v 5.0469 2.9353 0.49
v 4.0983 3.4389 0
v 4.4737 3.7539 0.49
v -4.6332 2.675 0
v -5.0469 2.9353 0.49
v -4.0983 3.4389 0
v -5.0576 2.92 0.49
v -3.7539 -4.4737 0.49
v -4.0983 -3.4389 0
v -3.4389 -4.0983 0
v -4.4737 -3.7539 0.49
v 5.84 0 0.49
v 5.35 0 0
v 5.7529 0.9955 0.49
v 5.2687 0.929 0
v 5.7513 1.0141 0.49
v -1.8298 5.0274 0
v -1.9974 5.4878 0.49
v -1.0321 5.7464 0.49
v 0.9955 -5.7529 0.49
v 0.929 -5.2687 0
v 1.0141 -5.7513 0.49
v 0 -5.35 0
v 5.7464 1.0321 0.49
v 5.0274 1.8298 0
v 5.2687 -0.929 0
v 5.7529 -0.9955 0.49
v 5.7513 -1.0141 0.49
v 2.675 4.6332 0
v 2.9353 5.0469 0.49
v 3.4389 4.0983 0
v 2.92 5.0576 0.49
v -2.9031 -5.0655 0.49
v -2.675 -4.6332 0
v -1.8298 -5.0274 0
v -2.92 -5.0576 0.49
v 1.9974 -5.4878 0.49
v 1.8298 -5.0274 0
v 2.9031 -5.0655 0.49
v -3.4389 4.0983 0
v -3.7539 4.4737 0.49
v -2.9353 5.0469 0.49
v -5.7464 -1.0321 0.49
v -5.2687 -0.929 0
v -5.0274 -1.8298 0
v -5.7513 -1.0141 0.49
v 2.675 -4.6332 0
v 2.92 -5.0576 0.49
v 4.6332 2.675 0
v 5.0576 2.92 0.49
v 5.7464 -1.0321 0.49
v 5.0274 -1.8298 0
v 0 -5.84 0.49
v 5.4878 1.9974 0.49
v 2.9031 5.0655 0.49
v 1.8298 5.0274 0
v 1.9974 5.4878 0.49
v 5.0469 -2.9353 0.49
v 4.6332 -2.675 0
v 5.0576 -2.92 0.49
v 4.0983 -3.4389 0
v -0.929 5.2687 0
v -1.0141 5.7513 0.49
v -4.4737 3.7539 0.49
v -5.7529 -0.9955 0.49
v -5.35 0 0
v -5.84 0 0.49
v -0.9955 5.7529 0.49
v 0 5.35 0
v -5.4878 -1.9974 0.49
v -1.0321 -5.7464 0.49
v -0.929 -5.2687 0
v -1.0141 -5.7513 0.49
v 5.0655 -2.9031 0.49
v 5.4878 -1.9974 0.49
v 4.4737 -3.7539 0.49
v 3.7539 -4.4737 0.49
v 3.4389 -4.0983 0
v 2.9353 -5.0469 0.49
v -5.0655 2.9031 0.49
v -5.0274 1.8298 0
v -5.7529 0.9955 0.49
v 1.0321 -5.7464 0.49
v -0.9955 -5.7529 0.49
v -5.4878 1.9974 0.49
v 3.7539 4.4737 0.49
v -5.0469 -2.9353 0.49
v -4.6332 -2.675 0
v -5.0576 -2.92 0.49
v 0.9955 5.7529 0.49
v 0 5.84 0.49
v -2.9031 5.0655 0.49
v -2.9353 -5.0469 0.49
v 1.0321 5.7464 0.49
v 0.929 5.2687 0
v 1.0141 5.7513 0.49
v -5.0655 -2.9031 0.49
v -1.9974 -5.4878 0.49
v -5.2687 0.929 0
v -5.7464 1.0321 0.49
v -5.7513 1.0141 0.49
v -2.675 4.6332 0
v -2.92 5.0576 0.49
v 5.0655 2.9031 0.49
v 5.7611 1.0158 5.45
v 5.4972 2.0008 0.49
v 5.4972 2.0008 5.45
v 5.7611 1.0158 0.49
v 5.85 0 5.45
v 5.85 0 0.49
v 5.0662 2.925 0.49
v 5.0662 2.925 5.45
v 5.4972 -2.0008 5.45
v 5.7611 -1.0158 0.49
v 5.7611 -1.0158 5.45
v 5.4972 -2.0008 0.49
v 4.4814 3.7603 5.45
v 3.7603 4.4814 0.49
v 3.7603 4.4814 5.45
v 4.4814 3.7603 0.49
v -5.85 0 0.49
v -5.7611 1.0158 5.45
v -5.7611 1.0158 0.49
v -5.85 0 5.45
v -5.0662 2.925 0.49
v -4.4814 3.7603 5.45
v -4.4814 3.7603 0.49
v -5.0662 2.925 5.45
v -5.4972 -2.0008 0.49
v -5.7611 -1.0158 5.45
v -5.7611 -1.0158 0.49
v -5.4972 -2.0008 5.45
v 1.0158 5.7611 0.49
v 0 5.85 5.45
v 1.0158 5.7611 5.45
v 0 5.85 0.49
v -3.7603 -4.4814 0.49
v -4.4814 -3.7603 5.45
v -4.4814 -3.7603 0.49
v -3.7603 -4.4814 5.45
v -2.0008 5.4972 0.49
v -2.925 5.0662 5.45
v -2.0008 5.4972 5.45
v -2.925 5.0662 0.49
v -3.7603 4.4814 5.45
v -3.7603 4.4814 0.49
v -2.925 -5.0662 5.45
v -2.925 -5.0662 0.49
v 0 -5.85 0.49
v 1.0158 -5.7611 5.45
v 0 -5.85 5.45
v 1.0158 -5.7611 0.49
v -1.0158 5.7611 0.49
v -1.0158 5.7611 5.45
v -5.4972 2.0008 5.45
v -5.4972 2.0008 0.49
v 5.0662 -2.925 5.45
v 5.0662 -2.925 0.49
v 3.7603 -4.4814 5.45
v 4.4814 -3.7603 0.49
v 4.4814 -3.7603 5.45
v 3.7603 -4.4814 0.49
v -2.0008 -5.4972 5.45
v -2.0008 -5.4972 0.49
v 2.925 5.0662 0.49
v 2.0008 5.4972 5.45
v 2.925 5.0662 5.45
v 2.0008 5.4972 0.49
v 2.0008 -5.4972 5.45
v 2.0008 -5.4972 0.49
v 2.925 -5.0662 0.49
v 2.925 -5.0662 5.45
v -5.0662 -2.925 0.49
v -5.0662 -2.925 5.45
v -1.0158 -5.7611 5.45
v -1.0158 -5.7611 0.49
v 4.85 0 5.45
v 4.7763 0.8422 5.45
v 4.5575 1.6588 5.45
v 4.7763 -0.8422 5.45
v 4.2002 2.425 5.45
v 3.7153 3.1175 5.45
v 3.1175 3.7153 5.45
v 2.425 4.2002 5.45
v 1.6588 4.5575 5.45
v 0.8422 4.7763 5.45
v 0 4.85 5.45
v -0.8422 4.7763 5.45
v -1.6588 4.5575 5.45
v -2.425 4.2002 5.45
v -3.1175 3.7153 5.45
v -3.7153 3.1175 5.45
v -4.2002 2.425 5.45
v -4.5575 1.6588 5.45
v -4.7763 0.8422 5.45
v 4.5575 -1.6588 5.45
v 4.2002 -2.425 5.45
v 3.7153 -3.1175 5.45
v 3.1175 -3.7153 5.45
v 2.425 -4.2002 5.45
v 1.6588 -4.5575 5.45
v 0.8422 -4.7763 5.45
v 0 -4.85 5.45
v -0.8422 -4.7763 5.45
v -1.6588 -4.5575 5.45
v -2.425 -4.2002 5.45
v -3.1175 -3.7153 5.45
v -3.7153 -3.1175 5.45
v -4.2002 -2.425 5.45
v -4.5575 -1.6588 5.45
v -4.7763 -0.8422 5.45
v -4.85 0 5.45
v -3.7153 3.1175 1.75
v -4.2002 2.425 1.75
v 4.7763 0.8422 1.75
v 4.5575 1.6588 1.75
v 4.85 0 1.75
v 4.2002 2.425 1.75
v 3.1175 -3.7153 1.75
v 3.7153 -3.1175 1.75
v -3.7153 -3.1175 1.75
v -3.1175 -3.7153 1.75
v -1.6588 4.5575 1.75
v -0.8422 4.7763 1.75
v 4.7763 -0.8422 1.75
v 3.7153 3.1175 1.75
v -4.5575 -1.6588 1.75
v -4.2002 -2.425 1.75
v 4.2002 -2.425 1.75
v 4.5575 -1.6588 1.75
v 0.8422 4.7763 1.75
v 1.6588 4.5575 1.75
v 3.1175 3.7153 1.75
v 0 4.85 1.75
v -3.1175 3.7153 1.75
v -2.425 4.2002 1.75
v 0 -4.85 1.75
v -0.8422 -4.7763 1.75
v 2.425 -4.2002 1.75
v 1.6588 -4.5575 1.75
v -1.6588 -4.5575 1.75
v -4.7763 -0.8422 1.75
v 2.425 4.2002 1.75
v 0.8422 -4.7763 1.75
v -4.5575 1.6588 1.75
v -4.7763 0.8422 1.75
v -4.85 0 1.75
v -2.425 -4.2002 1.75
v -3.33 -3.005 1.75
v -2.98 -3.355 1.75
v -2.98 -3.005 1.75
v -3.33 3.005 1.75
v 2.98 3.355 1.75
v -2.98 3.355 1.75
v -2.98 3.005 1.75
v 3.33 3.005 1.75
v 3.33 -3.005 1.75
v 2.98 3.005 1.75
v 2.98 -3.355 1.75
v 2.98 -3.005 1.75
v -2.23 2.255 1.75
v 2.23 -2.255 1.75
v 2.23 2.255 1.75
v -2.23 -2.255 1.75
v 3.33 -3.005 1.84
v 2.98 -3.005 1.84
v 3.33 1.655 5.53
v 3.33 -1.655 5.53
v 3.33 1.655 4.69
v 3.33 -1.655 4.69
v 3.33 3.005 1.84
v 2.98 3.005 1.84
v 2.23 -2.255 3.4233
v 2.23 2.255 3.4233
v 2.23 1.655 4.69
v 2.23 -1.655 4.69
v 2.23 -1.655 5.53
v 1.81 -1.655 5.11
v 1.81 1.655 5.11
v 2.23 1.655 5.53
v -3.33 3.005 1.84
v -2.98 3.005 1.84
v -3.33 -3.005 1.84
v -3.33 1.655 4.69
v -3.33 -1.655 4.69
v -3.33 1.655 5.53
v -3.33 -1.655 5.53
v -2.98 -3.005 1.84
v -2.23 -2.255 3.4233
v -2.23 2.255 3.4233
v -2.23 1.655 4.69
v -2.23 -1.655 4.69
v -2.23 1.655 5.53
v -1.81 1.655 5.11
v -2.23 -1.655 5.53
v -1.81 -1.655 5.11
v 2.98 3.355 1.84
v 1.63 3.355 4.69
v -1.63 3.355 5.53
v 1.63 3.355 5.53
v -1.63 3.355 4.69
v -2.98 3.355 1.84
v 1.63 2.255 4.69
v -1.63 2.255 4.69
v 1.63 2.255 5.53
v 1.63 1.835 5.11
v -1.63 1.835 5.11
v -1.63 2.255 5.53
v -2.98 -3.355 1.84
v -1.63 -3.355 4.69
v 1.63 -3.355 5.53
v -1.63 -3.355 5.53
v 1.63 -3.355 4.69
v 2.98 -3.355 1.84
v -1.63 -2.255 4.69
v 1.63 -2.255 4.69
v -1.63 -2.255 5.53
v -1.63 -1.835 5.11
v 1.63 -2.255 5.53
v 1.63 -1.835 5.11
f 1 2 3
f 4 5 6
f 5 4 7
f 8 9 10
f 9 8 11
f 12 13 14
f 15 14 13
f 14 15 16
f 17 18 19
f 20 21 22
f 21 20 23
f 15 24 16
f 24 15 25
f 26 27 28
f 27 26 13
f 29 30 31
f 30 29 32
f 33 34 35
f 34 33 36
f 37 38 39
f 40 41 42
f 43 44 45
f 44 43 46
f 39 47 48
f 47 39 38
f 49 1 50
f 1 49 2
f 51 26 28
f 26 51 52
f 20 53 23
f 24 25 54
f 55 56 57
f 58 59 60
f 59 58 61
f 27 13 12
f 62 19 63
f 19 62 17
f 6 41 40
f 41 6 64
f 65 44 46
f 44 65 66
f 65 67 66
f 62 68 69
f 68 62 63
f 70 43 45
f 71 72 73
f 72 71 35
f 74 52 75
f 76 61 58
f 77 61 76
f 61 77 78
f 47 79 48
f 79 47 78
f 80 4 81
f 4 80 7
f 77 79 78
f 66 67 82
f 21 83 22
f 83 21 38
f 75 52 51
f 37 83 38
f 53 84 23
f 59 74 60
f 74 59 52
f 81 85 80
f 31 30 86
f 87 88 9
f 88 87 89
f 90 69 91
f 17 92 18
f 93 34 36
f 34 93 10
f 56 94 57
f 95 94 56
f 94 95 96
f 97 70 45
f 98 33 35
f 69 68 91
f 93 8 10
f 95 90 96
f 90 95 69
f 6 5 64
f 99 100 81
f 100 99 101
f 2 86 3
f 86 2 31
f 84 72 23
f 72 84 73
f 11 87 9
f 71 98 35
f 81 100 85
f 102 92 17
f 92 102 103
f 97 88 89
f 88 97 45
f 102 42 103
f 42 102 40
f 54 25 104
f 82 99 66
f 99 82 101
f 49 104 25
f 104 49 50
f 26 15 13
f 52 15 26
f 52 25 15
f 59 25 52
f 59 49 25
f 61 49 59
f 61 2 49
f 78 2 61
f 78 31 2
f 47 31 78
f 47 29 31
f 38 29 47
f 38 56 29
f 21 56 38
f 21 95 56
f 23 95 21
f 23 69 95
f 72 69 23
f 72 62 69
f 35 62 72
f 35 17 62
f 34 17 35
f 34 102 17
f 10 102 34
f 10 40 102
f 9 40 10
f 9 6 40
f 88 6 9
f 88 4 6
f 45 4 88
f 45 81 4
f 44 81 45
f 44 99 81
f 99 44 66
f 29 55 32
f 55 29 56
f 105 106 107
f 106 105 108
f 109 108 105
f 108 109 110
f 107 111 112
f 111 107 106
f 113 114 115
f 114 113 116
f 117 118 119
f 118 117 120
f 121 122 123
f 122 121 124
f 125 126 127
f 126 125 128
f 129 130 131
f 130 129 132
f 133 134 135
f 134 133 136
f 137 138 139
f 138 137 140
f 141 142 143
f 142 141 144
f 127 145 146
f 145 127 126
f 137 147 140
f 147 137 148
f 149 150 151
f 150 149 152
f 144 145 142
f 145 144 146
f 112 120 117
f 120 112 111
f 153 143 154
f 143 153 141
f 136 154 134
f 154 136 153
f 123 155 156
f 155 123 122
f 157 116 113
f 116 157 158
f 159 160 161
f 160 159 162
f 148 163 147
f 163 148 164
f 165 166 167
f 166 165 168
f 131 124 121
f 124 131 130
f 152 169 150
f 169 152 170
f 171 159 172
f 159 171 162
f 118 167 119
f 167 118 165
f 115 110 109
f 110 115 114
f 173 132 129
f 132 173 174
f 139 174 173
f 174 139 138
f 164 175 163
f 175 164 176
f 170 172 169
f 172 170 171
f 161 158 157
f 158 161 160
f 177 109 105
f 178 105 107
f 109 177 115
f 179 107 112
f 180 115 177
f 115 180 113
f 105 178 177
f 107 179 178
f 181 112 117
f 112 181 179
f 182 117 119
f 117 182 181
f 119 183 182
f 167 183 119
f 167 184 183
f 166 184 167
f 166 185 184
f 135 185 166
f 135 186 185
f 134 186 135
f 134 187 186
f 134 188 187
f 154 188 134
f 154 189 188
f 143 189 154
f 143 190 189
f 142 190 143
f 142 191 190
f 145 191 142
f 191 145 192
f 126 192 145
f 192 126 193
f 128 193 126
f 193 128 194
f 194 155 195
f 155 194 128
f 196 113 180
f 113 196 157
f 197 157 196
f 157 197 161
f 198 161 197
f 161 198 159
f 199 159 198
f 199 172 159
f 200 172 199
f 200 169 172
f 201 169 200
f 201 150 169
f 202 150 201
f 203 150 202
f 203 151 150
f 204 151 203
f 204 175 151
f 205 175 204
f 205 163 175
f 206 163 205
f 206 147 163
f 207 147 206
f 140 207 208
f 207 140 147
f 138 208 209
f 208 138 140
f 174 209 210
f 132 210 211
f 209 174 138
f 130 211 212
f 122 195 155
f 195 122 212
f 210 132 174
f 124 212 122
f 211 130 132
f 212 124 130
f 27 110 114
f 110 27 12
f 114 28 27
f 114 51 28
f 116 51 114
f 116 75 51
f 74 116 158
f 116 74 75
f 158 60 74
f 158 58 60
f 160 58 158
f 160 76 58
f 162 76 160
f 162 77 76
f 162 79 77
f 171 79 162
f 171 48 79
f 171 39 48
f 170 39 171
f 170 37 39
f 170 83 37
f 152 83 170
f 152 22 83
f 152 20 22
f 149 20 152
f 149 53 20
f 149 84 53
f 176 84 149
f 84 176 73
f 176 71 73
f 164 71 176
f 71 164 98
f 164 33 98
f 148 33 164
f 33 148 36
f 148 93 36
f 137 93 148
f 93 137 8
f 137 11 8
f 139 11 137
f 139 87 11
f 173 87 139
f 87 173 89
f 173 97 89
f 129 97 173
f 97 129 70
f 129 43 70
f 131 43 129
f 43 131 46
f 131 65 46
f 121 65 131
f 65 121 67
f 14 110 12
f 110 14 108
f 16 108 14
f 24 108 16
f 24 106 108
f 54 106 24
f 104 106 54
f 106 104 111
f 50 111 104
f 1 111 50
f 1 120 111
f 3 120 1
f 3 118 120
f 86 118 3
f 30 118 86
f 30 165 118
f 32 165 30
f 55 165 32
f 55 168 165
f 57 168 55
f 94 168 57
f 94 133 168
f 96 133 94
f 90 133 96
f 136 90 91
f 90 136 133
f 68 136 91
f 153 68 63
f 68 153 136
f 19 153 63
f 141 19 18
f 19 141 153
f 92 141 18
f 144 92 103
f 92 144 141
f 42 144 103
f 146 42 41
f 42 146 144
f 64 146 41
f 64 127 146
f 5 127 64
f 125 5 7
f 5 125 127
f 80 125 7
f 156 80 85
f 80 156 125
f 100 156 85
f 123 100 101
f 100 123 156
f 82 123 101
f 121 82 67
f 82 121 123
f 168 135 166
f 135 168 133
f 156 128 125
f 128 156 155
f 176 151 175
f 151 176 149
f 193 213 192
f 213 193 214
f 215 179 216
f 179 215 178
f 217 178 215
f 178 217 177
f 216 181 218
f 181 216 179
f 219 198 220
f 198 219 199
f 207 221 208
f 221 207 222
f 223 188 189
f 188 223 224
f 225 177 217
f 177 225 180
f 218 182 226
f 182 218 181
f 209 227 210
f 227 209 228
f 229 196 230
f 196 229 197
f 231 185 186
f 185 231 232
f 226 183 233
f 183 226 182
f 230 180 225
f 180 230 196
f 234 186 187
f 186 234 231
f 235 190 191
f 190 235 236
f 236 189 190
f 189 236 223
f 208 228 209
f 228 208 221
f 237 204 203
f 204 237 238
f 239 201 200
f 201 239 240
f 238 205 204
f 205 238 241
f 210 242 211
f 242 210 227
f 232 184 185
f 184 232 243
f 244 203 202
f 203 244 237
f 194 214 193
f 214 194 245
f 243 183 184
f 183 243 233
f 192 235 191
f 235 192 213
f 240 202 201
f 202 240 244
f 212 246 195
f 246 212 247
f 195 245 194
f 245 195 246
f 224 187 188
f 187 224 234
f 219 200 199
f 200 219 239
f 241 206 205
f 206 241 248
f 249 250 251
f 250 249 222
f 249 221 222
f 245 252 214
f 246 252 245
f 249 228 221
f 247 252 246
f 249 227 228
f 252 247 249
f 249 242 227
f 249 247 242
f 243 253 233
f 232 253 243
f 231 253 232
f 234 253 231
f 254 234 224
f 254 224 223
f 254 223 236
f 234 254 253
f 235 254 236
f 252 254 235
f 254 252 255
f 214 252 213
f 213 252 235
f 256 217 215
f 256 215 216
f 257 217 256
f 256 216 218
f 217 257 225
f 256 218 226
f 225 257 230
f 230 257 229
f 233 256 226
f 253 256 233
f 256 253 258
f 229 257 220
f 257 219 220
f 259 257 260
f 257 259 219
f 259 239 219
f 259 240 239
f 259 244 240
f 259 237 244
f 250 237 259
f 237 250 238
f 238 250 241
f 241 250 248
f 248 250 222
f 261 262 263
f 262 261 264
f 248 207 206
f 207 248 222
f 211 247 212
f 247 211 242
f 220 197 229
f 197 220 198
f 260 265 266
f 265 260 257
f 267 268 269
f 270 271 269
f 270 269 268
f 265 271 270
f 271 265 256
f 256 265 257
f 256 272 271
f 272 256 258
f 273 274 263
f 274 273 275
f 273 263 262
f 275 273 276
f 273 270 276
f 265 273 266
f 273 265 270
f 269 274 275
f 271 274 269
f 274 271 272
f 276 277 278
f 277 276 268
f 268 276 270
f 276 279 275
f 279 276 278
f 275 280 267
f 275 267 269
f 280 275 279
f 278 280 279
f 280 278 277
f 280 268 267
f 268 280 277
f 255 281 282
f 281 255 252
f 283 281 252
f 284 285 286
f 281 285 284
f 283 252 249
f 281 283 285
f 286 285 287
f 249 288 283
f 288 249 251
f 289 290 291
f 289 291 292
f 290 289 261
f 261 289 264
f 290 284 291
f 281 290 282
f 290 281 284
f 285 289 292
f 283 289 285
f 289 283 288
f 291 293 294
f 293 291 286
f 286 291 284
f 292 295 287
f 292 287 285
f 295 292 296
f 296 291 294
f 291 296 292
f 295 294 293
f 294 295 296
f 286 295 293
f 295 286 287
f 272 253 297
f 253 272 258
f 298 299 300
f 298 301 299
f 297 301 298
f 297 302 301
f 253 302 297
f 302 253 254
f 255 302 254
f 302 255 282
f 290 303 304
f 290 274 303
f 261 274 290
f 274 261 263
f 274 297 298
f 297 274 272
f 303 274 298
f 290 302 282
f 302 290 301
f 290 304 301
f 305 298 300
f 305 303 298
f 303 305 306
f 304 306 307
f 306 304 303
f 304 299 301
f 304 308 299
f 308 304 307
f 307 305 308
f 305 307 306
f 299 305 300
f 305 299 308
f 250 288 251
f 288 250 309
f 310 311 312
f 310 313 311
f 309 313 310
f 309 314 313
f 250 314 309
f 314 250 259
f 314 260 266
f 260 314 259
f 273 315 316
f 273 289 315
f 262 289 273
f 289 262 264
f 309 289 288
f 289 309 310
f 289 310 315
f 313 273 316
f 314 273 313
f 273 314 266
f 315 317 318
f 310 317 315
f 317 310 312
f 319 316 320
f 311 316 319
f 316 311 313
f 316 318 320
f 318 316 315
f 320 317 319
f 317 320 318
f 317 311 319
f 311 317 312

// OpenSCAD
// This file was processed by resolve-include.py [https://github.com/arpruss/miscellaneous-scad/blob/master/scripts/resolve-include.py] 
// to include  all the dependencies inside one file.


//BEGIN DEPENDENCY: use <tubemesh.scad>;

//BEGIN DEPENDENCY: use <eval.scad>;
function _isRange(v) = !is_list(v) && !is_string(v) && v[0] != undef;

$careful = false;

function _substr(s, start=0, stop=undef, soFar = "") =
    start >= (stop==undef ? len(s) : stop) ? soFar :
        _substr(s, start=start+1, stop=stop, soFar=str(soFar, s[start]));

function _parseInt(s, start=0, stop=undef, accumulated=0) =
    let( stop = stop==undef ? len(s) : stop )
        start >= stop ? accumulated :
        s[start] == "+" ? _parseInt(s, start=start+1, stop=stop) :
        s[start] == "-" ? -_parseInt(s, start=start+1, stop=stop) :
        let (digit = search(s[start], "0123456789"))
            digit == [] ? 0 : _parseInt(s, start=start+1, stop=stop, accumulated=accumulated*10+digit[0]);

function _findNonDigit(s, start=0) =
    start >= len(s) || s[start]<"0" || s[start]>"9" ? start :
    _findNonDigit(s, start=start+1);

function _replaceChar(s,c1,c2,pos=0,soFar="") =
    pos >= len(s) ? soFar :
    _replaceChar(s,c1,c2,pos=pos+1,soFar=str(soFar, s[pos]==c1 ? c2 : s[pos]));

function _parseUnsignedFloat(s) =
    len(s) == 0 ? 0 :
        let(
            firstNonDigit = _findNonDigit(s),
            decimalPart = s[firstNonDigit]!="." ?
                [firstNonDigit,firstNonDigit] : [firstNonDigit+1, _findNonDigit(s, start=firstNonDigit+1)],
            intPart = _parseInt(s,start=0,stop=firstNonDigit),
            fractionPart = _parseInt(s,start=decimalPart[0],stop=decimalPart[1]),
            baseExp = s[decimalPart[1]]=="e" || s[decimalPart[1]]=="E" ? pow(10,_parseInt(s, start=decimalPart[1]+1)) : 1)
            (intPart+fractionPart*pow(10,-(decimalPart[1]-decimalPart[0])))*baseExp;

function _tail(v) = len(v)>=2 ? [for(i=[1:len(v)-1]) v[i]] : [];
function _isspace(c) = (" " == c || "\t" == c || "\r" == c || "\n" == c );
function _isdigit(c) = ("0" <= c && c <= "9" );
function _isalpha(c) = ("a" <= c && c <= "z") || ("A" <= c && c <= "Z");
function _isalpha_(c) = _isalpha(c)  || c=="_";
function _isalnum_(c) = _isalpha(c) || _isdigit(c) || c=="_";
function _flattenLists(ll) = [for(a=ll) for(b=a) b];

function _spaceSequence(s, start=0, count=0) =
    len(s)>start && _isspace(s[start]) ? _spaceSequence(s, start=start+1, count=count+1) : count;
function _digitSequence(s, start=0, count=0) =
    len(s)>start && _isdigit(s[start]) ? _digitSequence(s, start=start+1,count=count+1) : count;
function _alnum_Sequence(s, start=0, count=0) =
    len(s)>start && _isalnum_(s[start]) ? _alnum_Sequence(s, start=start+1,count=count+1) : count;
function _identifierSequence(s, start=0, count=0) =
    len(s)>start && _isalpha_(s[start]) ? _alnum_Sequence(s, start=start+1, count=count+1) : count;
function _signedDigitSequence(s, start=0) =
    len(s) <= start ? 0 :
        (s[start] == "+" || s[start] == "-" ) ? 1+_digitSequence(s,start=start+1) : _digitSequence(s,start=start);
function _realStartingWithDecimal(s, start=0) =
    len(s)>start && s[start] == "." ?
        let(next = start+1+_digitSequence(s, start=start+1))
        (s[next] == "e" || s[next] == "E" ?
            next-start+1+_signedDigitSequence(s, start=next+1) : next-start)
        : 0;
function _realContinuation(s, start=0) =
    len(s) <= start ? 0 :
        let(c1=_realStartingWithDecimal(s, start=start))
        c1 > 0 ? c1 :
        s[start] == "e" || s[start] == "E" ?
            1+_signedDigitSequence(s, start=start+1) : 0;
function _positiveRealSequence(s, start=0) =
    len(s) <= start ? 0 :
        let(c1 = _realStartingWithDecimal(s, start=start))
            c1 > 0 ? c1 :
        let(c2 = _digitSequence(s, start=start))
            c2 > 0 ? c2 + _realContinuation(s, start=start+c2) : 0;

_multiSymbolOperators = [ "<=", ">=", "==", "&&", "||" ]; // must be in order of decreasing length

function _multiSymbolOperatorSequence(s, start=0) =
    (s[start]=="<" && s[start+1]=="=") ||
    (s[start]==">" && s[start+1]=="=") ||
    (s[start]=="=" && s[start+1]=="=") ||
    (s[start]=="!" && s[start+1]=="=") ||
    (s[start]=="&" && s[start+1]=="&") ||
    (s[start]=="|" && s[start+1]=="|") ? 2 : 0;

function _tokenize(s, start=0) =
    start >= len(s) ? [] :
    let(c1=_spaceSequence(s, start=start)) c1>0 ?
        concat([" "], _tokenize(s, start=start+c1)) :
    let(c2=_identifierSequence(s, start=start)) c2>0 ?
        concat([_substr(s, start=start, stop=start+c2)], _tokenize(s, start=start+c2)) :
    let(c3=_positiveRealSequence(s, start=start)) c3>0 ?
        concat([_substr(s, start=start, stop=start+c3)], _tokenize(s, start=start+c3)) :
    let(c4=_multiSymbolOperatorSequence(s, start=start)) c4>0 ?
        concat([_substr(s, start=start, stop=start+c4)], _tokenize(s, start=start+c4)) :
        concat([s[start]], _tokenize(s, start=start+1));


function _endParens(list,start=0,openCount=0,stop=undef) =
    let(stop = stop==undef ? len(list) : stop)
    start >= stop ? (openCount?undef:stop) :
    list[start][0] == ")" ?
            (openCount==1 ? start+1 : _endParens(list,start+1,stop=stop, openCount=openCount-1)) :
    _endParens(list,start+1,stop=stop, openCount=
        list[start][0] == "(" ?
            openCount+1 : openCount);

function _indexInTable(string, table, column=0) =
    let (s=search([string], table, index_col_num=column))
        s[0] == [] ? -1 : s[0][0];

_NAME = 0;
_ARITY = 1;
_PREC = 2;
_ASSOC_DIR = 3;
_ARGUMENTS_FROM_VECTOR = 4;
_OPERATOR = 5;
_EXTRA_DATA = 6;

function _func(op) = [ op, 1, -1, 1, true, op ];

_operators = [
    [ "[", 1, -1, 1, true, "[" ],
    [ "pow", 1, -1, 1, true, "^" ],
    [ "cross", 1, -1, 1, true, "cross" ],
    _func("sqrt"),
    _func("cos"),
    _func("sin"),
    _func("tan"),
    _func("acos"),
    _func("asin"),
    _func("atan"),
    _func("COS"),
    _func("SIN"),
    _func("TAN"),
    _func("ACOS"),
    _func("ASIN"),
    _func("ATAN"),
    _func("abs"),
    _func("ceil"),
    _func("exp"),
    _func("floor"),
    _func("ln"),
    _func("log"),
    _func("round"),
    _func("sign"),
    _func("norm"),
    [ "atan2", 1, -1, 1, true, "atan2" ],
    [ "ATAN2", 1, -1, 1, true, "ATAN2" ],
    [ "max", 1, -1, 1, true, "max" ],
    [ "min", 1, -1, 1, true, "min" ],
    [ "concat", 1, -1, 1, true, "concat" ],
    [ "#", 2, 0, -1, false, "#" ],
    [ "^", 2, 0, -1, false, "^" ],
    [ "#-",1, 0.5, 0, true, "-" ],
    [ "#+",1, 0.5, 0, true, "+" ],
    [ "*", 2, 1, 1, false, "*" ],
    [ "/", 2, 1, 1, false, "/" ],
    [ "%", 2, 1, 1, false, "%" ],
    [ "+", 2, 2, 1, true, "+" ],
    [ "-", 2, 2, 1, true, "-" ],
    [ "!=", 2, 3, 1, true, "!=" ],
    [ "==", 2, 3, 1, true, "==" ],
    [ "<=", 2, 3, 1, true, "<=" ],
    [ ">=", 2, 3, 1, true, ">=" ],
    [ "<", 2, 3, 1, true, "<" ],
    [ ">", 2, 3, 1, true, ">" ],
    [ "!", 1, 4, 1, true, "!" ],
    [ "&&", 2, 5, 1, true, "&&" ],
    [ "||", 2, 5, 1, true, "||" ],
    [ "?", 2, 10, -1, true, "?" ],
    [ ":", 2, 10, -1, true, ":" ],
    [ "=", 2, 30, 1, true, "=" ], // for let()
    [ "let", 1, 25, 1, true, "let" ],
    [ ",", 2, 100, 1, true, "," ]
   ];

_binary_or_unary = [ ["-", "#-"], ["+", "#+"], ["#", "["] ];

// insert parentheses in some places to tweak the order of
// operations in those contexts
function _fixBrackets(pretok,start=0) =
    start >= len(pretok) ? [] :
    pretok[start] == "[" ?
        concat(["#", "("], _fixBrackets(pretok,start=start+1)) :
    pretok[start] == "]" ?
        concat([")"], _fixBrackets(pretok,start=start+1)) :
    pretok[start] == "?" ?
        concat([pretok[start],"("], _fixBrackets(pretok,start=start+1)) :
    pretok[start] == ":" ?
        concat([")",pretok[start]], _fixBrackets(pretok,start=start+1)) :
        concat(pretok[start], _fixBrackets(pretok,start=start+1));

// disambiguate operators that can be unary or binary
function _fixUnaries(pretok) =
    [ for (i=[0:len(pretok)-1])
         let (
            a = pretok[i],
            j=_indexInTable(a, _binary_or_unary))
            (0 <= j && (i == 0 || pretok[i-1] == "(" ||
                0 <= _indexInTable(pretok[i-1], _operators)))? _binary_or_unary[j][1] : a ];

function _fixLet1(tok, start=0, stop=undef) =
    let (stop = stop==undef ? len(tok) : stop)
        start >= stop ? [] :
        tok[start][0] == "let"?
           let(endP=_endParens(tok,start=start+1,stop=stop,openCount=0)) concat([concat(tok[start], [_fixLet1(tok,start=start+2,stop=endP-1)])], _fixLet1(tok,start=endP,stop=stop)) :
        concat([tok[start]], _fixLet1(tok,start=start+1,stop=stop));

function _parsePass1(s) =
    let (pretok=_fixUnaries(_fixBrackets(_tokenize(s))))
    _fixLet1(
    [ for (i=[0:len(pretok)-1])
        let (a=pretok[i])
        if (a[0] != " ")
            let (j=_indexInTable(a, _operators))
                j >= 0 ? _operators[j] : [a] ] );

function _prec(op1, pos1, op2, pos2) =
    op1 != undef && op2 == undef ? false :
    op1 == undef && op2 != undef ? true :
    op1 == undef && op2 == undef ? true :
    op1[_ARITY] == 1 && pos1 > pos2 ? true :
    op2[_ARITY] == 1 && pos2 > pos1 ? false :
    op1[_PREC] < op2[_PREC] ? true :
        op2[_PREC] < op1[_PREC] ? false :
            op1[_ASSOC_DIR] * pos1 < op2[_ASSOC_DIR] * pos2;

function _parseLiteralOrVariable(s) =
        s == "PI" ? PI :
        s == "true" ? true :
        s == "false" ? false :
        //s == "undef" ? undef : // TODO: better fix for undef than this hackish one
        _isalpha_(s[0]) ? s :
        _parseUnsignedFloat(s);

function _isoperator(token) = _PREC<len(token);

function _getCandidatesForMainOperator(tok,start,stop) =
   start >= stop ? [] :
   tok[start][0] == "(" ?
        _getCandidatesForMainOperator(tok,_endParens(tok,start=start+1,stop=stop,openCount=1),stop)
        :
        _isoperator(tok[start]) ? concat([[tok[start],start]],_getCandidatesForMainOperator(tok,start+1,stop)) :
        _getCandidatesForMainOperator(tok,start+1,stop);

// Find the operator with least precedence
function _findMainOperatorPos(candidates,start=0) =
    len(candidates) <= start ? undef :
    let(rest=_findMainOperatorPos(candidates,start+1))
    _prec(candidates[rest][0], rest, candidates[start][0], start) ? start : rest;

function _firstOccurrence(c,opName,start=0) =
    start >= len(c) ? undef :
    c[start][0][0] == opName ? c[start] :
        _firstOccurrence(c,opName,start=start+1);

function _mainOperator(tok,start,stop) =
    let(c=_getCandidatesForMainOperator(tok,start,stop),
        pos=_findMainOperatorPos(c),
        m=c[pos])
        m[0][0] == "?" ?
            concat(m, [_firstOccurrence(c,":",start=pos+1)[1]])
            : m;

function _doLets(assignments, final, start=0) =
    start >= len(assignments) ? final :
    assignments[start][0] == "=" ? ["let", ["'", assignments[start][1]], assignments[start][2], _doLets(assignments, final, start=start+1)] : _doLets(assignments, final, start=start+1);

function _letOperator(a,b) =
    let(rawAssignments=_fixCommas(a),
        assignments=rawAssignments[0] == "[[" ?
            _tail(rawAssignments) : [a])
    _doLets(assignments, b);

/* This takes a fully tokenized vector, each element of which is either a line from the _operators table or a vector containing a single non-operator string, and parses it using general parenthesis and operator parsing. Comma expressions for building vectors will be parsed in the next pass. */
function _parseMain(tok,start=0,stop=undef) =
    let( stop= stop==undef ? len(tok) : stop )
        stop <= start ? [] :
        tok[start][0] == "(" && _endParens(tok,start=start+1,stop=stop,openCount=1)==stop ?
            _parseMain(tok,start=start+1,stop=stop-1) :
        let( lp = _mainOperator(tok,start,stop) )
            lp[0] == undef ? ( stop-start>1 ? undef : _parseLiteralOrVariable(tok[start][0]) ) :
            let( op = lp[0], pos = lp[1] )
                op[_NAME] == "?" ?
                    [ op[_OPERATOR], _parseMain(tok,start=start,stop=pos), _parseMain(tok,start=pos+1,stop=lp[2]), _parseMain(tok,start=lp[2]+1,stop=stop) ] :
                op[_NAME] == "let" ?
                    _letOperator( _parseMain(op[_EXTRA_DATA]), _parseMain(tok,start=pos+1,stop=stop)) :
                let(rhs=_parseMain(tok,start=pos+1,stop=stop))
                op[_ARITY] == 2 ?
                    (start==pos ?
                    /* unary use of binary operator */
                    let(j=_indexInTable(op[_OPERATOR], _binary_or_unary)) [ _binary_or_unary[j][1],rhs] : [ op[_OPERATOR], _parseMain(tok,start=start,stop=pos), rhs])
                    : [ op[_OPERATOR], rhs ];


// this upgrades sequences of binary commas to vectors
function _fixCommas(expression) =
    expression[0] == "," ?
        let(a=_fixCommas(expression[1]),
            b=_fixCommas(expression[2]))
            a[0] == "[[" ?
                concat(["[["],concat(_tail(a), [b])) :
                ["[[",a,b]
        :
    is_list(expression) ?
            (expression[1] == [] ? [expression[0]] :
            concat([expression[0]], [for (i=[1:1:len(expression)-1]) _fixCommas(expression[i])]) ) :
            expression;

// fix arguments from vectors
function _fixArguments(expression) =
    let(i=_indexInTable(expression[0], _operators, _OPERATOR))
            i >=0 && _operators[i][_ARGUMENTS_FROM_VECTOR] && expression[1][0] == "[[" ? concat([expression[0]], [for (i=[1:len(expression[1])-1]) _fixArguments(expression[1][i])]) :
/*            expression[0] == "?" ?
                concat([expression[0],expression[1]],[for (i=[1:len(expression[2])-1]) _fixArguments(expression[2][i])]) : */
            is_list(expression) && len(expression)>1 ?
                concat([expression[0]], [for (i=[1:len(expression)-1]) _fixArguments(expression[i])])
                    : expression;

function _optimizedLiteral(x) =
    is_num(x) || is_bool(x) || is_undef(x) ? x : ["'", x];

function _wellDefined(x) =
    is_undef(x) ? false :
    is_num(x) || is_bool(x) ? true :
    x[0] == "'" ? true :
    len(x)==1 ? x[0]!=undef :
    len([for (a=x) if(!_wellDefined(a)) true])==0;

function _optimize(expression) =
    let(x=eval(expression,$careful=true))
        _wellDefined(x) ? _optimizedLiteral(x) :
        expression[0] == "'" ? _optimizedLiteral(x) :
        ! is_string(expression) ?
            concat([expression[0]], [for(i=[1:len(expression)-1]) (i>1 || expression[0] != "let") ?  _optimize(expression[i]) : expression[i]]) :
        expression;

function compileFunction(expression,optimize=true) =
            is_list(expression) ? expression :
            is_num(expression) ? expression :
            let(unoptimized = _fixArguments(_fixCommas(_parseMain(_parsePass1(expression)))))
        optimize ? _optimize(unoptimized) : unoptimized;

function evaluateFunction(expression,variables) = eval(compileFunction(expression,optimize=false),variables);

function _let(v, var, value) = concat([var, value], v);

function _lookupVariable(var, table) =
    let (s=search([var], table, index_col_num=0))
        s[0] == [] ? undef : table[s[0][0]][1];

function _generate(var, range, expr, v) =
    [ for(i=range) eval(expr, _let(v, var, i)) ];

function _haveUndef(v,n=0) =
    n >= len(v) ? false :
    is_undef(v[n]) ? true :
    _haveUndef(v,n=n+1);

function eval(c,v=[]) =
    is_string(c) ? _lookupVariable(c,v) :
    let(op=c[0]) (
    op == undef ? c :
    op == "'" ? c[1] :
    op == "&&" ? (!$careful ? eval(c[1],v)&&eval(c[2],v) :
        (let(c1=eval(c[1],v))
        c1==undef ? undef :
        !c1 ? false :
        let(c2=eval(c[2],v))
        c2==undef ? undef :
        c1 && c2) ) :
    op == "||" ? (!$careful ? eval(c[1],v)||eval(c[2],v) :
        (let(c1=eval(c[1],v))
        c1==undef ? undef :
        c1 ? true :
        let(c2=eval(c[2],v))
        c2==undef ? undef :
        c1 || c2) ) :
    op == "let" ? (!$careful ? eval(c[3],concat([[eval(c[1],v),eval(c[2],v)]], v)) :
            let(c1=eval(c[1],v),c2=eval(c[2],v))
                c1==undef || c2==undef ? undef :
                    eval(c[3],concat([[c1,c2]], v)) ) :
    op == "gen" ? _generate(eval(c[1],v),eval(c[2],v),c[3],v) :
    let(args = [for(i=[1:1:len(c)-1]) eval(c[i],v)])
        $careful && _haveUndef(args) ? undef :
    op == "+" ? (len(args)==1 ? args[0] : args[0]+args[1]) :
    op == "-" ? (len(args)==1 ? -args[0] : args[0]-args[1]) :
    op == "*" ? args[0]*args[1] :
    op == "/" ? args[0]/args[1] :
    op == "%" ? args[0]%args[1] :
    op == "sqrt" ? sqrt(args[0]) :
    op == "^" || op == "pow" ? pow(args[0],args[1]) :
    op == "cos" ? cos(args[0]) :
    op == "sin" ? sin(args[0]) :
    op == "tan" ? tan(args[0]) :
    op == "acos" ? acos(args[0]) :
    op == "asin" ? asin(args[0]) :
    op == "atan" ? atan(args[0]) :
    op == "atan2" ? atan2(args[0],args[1]) :
    op == "COS" ? cos(args[0]*180/PI) :
    op == "SIN" ? sin(args[0]*180/PI) :
    op == "TAN" ? tan(args[0]*180/PI) :
    op == "ACOS" ? acos(args[0])*PI/180 :
    op == "ASIN" ? asin(args[0])*PI/180 :
    op == "ATAN" ? atan(args[0])*PI/180 :
    op == "ATAN2" ? atan2(args[0],args[1])*PI/180 :
    op == "abs" ? abs(args[0]) :
    op == "ceil" ? ceil(args[0]) :
    op == "cross" ? cross(args[0],args[1]) :
    op == "exp" ? exp(args[0]) :
    op == "floor" ? floor(args[0]) :
    op == "ln" ? ln(args[0]) :
    op == "len" ? len(args[0]) :
    op == "log" ? log(args[0]) :
    op == "max" ? (len(args) == 1 ? max(args[0]) : max(args)) :
    op == "min" ? (len(args) == 1 ? min(args[1]) : min(args)) :
    op == "norm" ? norm(args[0]) :
    op == "rands" ? rands(args[0],args[1],args[2],args[3]) :
    op == "round" ? round(args[0]) :
    op == "sign" ? sign(args[0]) :
    op == "[" ? args :
    op == "#" ? args[0][args[1]] :
    op == "<" ? args[0]<args[1] :
    op == "<=" ? args[0]<=args[1] :
    op == ">=" ? args[0]>=args[1] :
    op == ">" ? args[0]>args[1] :
    op == "==" ? args[0]==args[1] :
    op == "!=" ? args[0]!=args[1] :
    op == "!" ? !args[0] :
    op == "?" ? (args[0]?args[1]:args[2]) :
    op == "concat" ? [for (a=args) for(v=a) v] :
    op == "range" ? (len(args)==2 ? [args[0]:args[1]] : [args[0]:args[1]:args[2]]) :
    undef
    );

// per 10,000 operations with "x^3*y-x*y^3"
// 24 sec compile
// 21 sec unoptimized compile
// 22 sec evaluateFunction()
// 0.7 sec eval

// pass1 10 seconds [tokenize: 4 seconds]
// parseMain 6
// fixCommas 0
// fixArguments 3
// optimize 3
/*
echo(compileFunction("x^(2*3)"));
fc = compileFunction("x^3*y-x*y^3",optimize=true);
echo(fc);
echo(eval(fc,[["x",1],["y",1]]));
z=[for(i=[0:9999]) compileFunction("x^3*y-x*y^3",optimize=false)];//fc,[ ["x",1],["y",2] ])];
*/

//z = [for(i=[1:10000]) compileFunction("x^3*y-x*y^3")];
// normal: 23

//function repeat(s, copies, soFar="") = copies <= 0 ? soFar : repeat(s, copies-1, soFar=str(soFar,s));

//END DEPENDENCY: use <eval.scad>;


// written for tail-recursion
// _subtotals[i] = list[0] + ... + list[i-1]
function _subtotals(list,soFar=[]) =
        len(soFar) >= 1+len(list) ? soFar :
        _subtotals(list,
            let(n1=len(soFar))
            concat(soFar, n1>0 ? soFar[n1-1]+list[n1-1] : 0));

function _flatten(list) = [for (a=list) for(b=a) b];

function _reverseTriangle(t) = [t[2], t[1], t[0]];

function _mod(a,b) =
    let (m=a%b)
    m < 0 ? b+m : m;

// smallest angle in triangle
function _minAngle(p1,p2,p3) =
    let(a = p2-p1,
        b = p3-p1,
        c = p3-p2,
        v1 = a*b,
        v2 = -(c*a))
        v1 == 0 || v2 == 0 ? 0 :
        let( na = norm(a),
             a1 = acos(v1 / (na*norm(b))),
             a2 = acos(v2 / (na*norm(c))) )
        min(a1,a2,180-(a1+a2));

// triangulate square to maximize smallest angle
function _doSquare(points,i11,i21,i22,i12,optimize=1) =
    points[i11]==points[i12] ? [[i11,i21,i22]] :
    points[i21]==points[i22] ? [[i22,i12,i11]] :
    !optimize ? [[i11,i21,i22], [i22,i12,i11]] :
    let (m1 = min(_minAngle(points[i11],points[i21],points[i22]), _minAngle(points[i22],points[i12],points[i11])),
        m2 = min(_minAngle(points[i11],points[i21],points[i12]),
                _minAngle(points[i21],points[i22],points[i12])) )
        m2 <= m1 ? [[i11,i21,i22], [i22,i12,i11]] :
                  [[i11,i21,i12], [i21,i22,i12]];

/*
function _inTriangle(v1,t) = (v1==t[0] || v1==t[1] || v1==t[2]);

function _findTheDistinctVertex(t1,t2) =
    let(in = [for(i=[0:2]) _inTriangle(t1[i],t2)])
    ! in[0] && in[1] && in[2] ? 0 :
    ! in[1] && in[0] && in[2] ? 1 :
    ! in[2] && in[0] && in[1] ? 2 :
    undef;

// make vertex i come first
function _rotateTriangle(t,i) =
    [for (j=[0:2]) t[(j+i)%3]];

function _optimize2Triangles(points,t1,t2) =
    let(i1 = _findTheDistinctVertex(t1,t2))
    i1 == undef ? [t1,t2] :
    let(i2 = _findTheDistinctVertex(t2,t1))
    i2 == undef ? [t1,t2] :
    _doSquare(points,t1[(i1+2)%3],t1[i1],t2[(i2+2)%3],t2[i2],optimize=1);

// a greedy optimization for a strip of triangles most of which adjoin one another; written for tail-recursion
function _optimizeTriangles(points,triangles,position=0,optimize=1,iterations=4) =
        !optimize || position >= iterations*len(triangles) ? triangles :
            _optimizeTriangles(points,
                let(
                    n = len(triangles),
                    position1=position%n,
                    position2=(position+1)%n,
                    opt=_optimize2Triangles(points,triangles[position1],triangles[position2]))
                    [for (i=[0:len(triangles)-1])
                        i == position1 ? opt[0] :
                        i == position2 ? opt[1] :
                            triangles[i]],
                position=position+1);
*/

function _removeEmptyTriangles(points,triangles) =
    [for(t=triangles)
        if(points[t[0]] != points[t[1]] && points[t[1]] != points[t[2]] && points[t[2]] != points[t[0]]) t];

// tail recursion
function _getClosest(points,index,count,ref,best=[undef,undef])
        = count <= 0 ? (best[0]==undef ? index : best[0]) :
          _getClosest(points,index+1,count-1,ref,
            best = best[0] == undef ||
            norm(points[index]-ref) < best[1] ?
            [index,norm(points[index]-ref)] : best);

function _getIndices(points,index1,n1,index2,n2,shift,i,optimize) =
        let (i1=[index2+_mod(i+shift,n2),
                 index2+_mod(i+1+shift,n2)])
        optimize < 0 ?
        [[_getClosest(points,index1,n1,points[i1[0]]),
          _getClosest(points,index1,n1,points[i1[1]])],
          i1] :
        [[index1+floor(i*n1/n2+0.5)%n1,
         index1+floor(((i+1)%n2)*n1/n2+0.5)%n1],
         i1];

// n1 and n2 should be fairly small, so this doesn't need
// tail-recursion
// this assumes n1<=n2
function _tubeSegmentTriangles0(points,index1,n1,index2,n2,shift=0,i=0,soFar=[],optimize=1)
    = i>=n2 ? _removeEmptyTriangles(points,soFar) :
            let(ii = _getIndices(points,index1,n1,index2,n2,shift,i,optimize),
                add = ii[0][0] == ii[0][1] ? [[ii[0][0],ii[1][0],ii[1][1]]] :
                    _doSquare(points,ii[0][0],ii[1][0],ii[1][1],ii[0][1],optimize=optimize))
                _tubeSegmentTriangles0(points,index1,n1,index2,n2,i=i+1,soFar=concat(soFar,add),shift=shift,optimize=optimize);

function _measureQuality(points, triangles, pos=0, sumThinnest=1e100) =
    pos >= len(triangles) ? sumThinnest :
        _measureQuality(points, triangles, pos=pos+1, sumThinnest=min(sumThinnest,_minAngle(points[triangles[pos][0]],points[triangles[pos][1]],points[triangles[pos][2]])));

function _bestTriangles(points,tt, pos=0, best=[0,-1/0]) =
        pos >= len(tt) || len(tt)<=1 ? tt[best[0]] :
        _bestTriangles(points, tt, pos=pos+1,
            best = let(q=_measureQuality(points,tt[pos]))
                        q>best[1] ? [pos,q] : best);

function _getMaxShift(o) = (!o || o==true || o < 0) ? 0 : o-1;

function _tubeSegmentTriangles(points,index1,n1,index2,n2,optimize=1) =
    _bestTriangles(points,[for (shift=[-_getMaxShift(optimize):_getMaxShift(optimize)]) _tubeSegmentTriangles0(points,index1,n1,index2,n2,shift=shift,optimize=optimize)]);

function _tubeSegmentFaces(points,index,n1,n2,optimize=1)
    = n1<n2 ? _tubeSegmentTriangles(points,index,n1,index+n1,n2,optimize=optimize) :
        [for (f=_tubeSegmentTriangles(points,index+n1,n2,index,n1,optimize=optimize)) _reverseTriangle(f)];

function _tubeMiddleFaces(points,counts,subtotals,optimize=1) = [ for (i=[1:len(counts)-1])
           for (face=_tubeSegmentFaces(points,subtotals[i-1],counts[i-1],counts[i],optimize=optimize)) face ];

function _endCaps(counts,subtotals,startCap=true,endCap=true) =
    let( n = len(counts),
         cap1 = counts[0]<=2 || !startCap ? undef : [for(i=[0:counts[0]-1]) i],
         cap2 = counts[n-1]<=2 || !endCap ? undef : [for(i=[counts[n-1]-1:-1:0]) subtotals[n-1]+i] )
       [for (c=[cap1,cap2]) if (c!=undef) c];

function _tubeFaces(sections,startCap=true,endCap=true,optimize=1) =
                let(
        counts = [for (s=sections) len(s)],
        points = _flatten(sections),
        subtotals = _subtotals(counts))
            concat(_tubeMiddleFaces(points,counts,subtotals,optimize=optimize),_endCaps(counts,subtotals,startCap=startCap,endCap=endCap));

function _removeDuplicates1(points,soFar=[[],[]]) =
        len(soFar[0]) >= len(points) ? soFar :
            _removeDuplicates1(points,
               let(
                mapSoFar=soFar[0],
                pointsSoFar=soFar[1],
                j=len(mapSoFar),
                k=search([points[j]], pointsSoFar)[0])
                k == []? [concat(mapSoFar,[len(pointsSoFar)]),
                            concat(pointsSoFar,[points[j]])] :
                           [concat(mapSoFar,[k]),pointsSoFar]);

function _removeDuplicates(points, faces) =
    let(fix=_removeDuplicates1(points),
        map=fix[0],
        newPoints=fix[1],
        newFaces=[for(f=faces) [for(v=f) map[v]]])
            [newPoints, newFaces];

function pointsAndFaces(sections,startCap=true,endCap=true,optimize=1) =
        let(
            points0=_flatten(sections),
            faces0=_tubeFaces(sections,startCap=startCap,endCap=endCap,optimize=optimize))
        _removeDuplicates(points0,faces0);

function sectionZ(section,z) = [for(xy=section) [xy[0],xy[1],z]];
function sectionX(section,x) = [for(yz=section) [x,yz[0],yz[1]]];
function sectionY(section,y) = [for(xz=section) [xz[0],y,xz[1]]];


function shiftSection(section,delta) = [for(p=section) [for(i=[0:len(delta)-1]) (p[i]==undef?0:p[i])+delta[i]]];

// the optimize parameter can be:
//   -1: nearest neighbor mesh optimization; this can produce meshes that are not watertight, and hence is not recommended unless you know what you are doing
//   0: no optimization at all
//   1: minimal optimization at the quad level
//   n>1: shift corresponding points in different layers by up to n-1 points to try to have the best triangles
module tubeMesh(sections,startCap=true,endCap=true,optimize=1) {
    pAndF = pointsAndFaces(sections,startCap=startCap,endCap=endCap,optimize=optimize);
    polyhedron(points=pAndF[0],faces=pAndF[1]);
}

// increase number of points from len(section) to n
function _interpolateSection(section,n) =
        let(m=len(section))
        n == m ? section :
        n < m ? undef :
            [for(i=[0:m-1])
                let(cur=floor(i*n/m),
                    k=floor((i+1)*n/m)-cur,
                    i2=(i+1)%m)
                    for(j=[0:k-1])
                        let(t=j/k)
                            section[i]*(1-t)+section[i2]*t];

function arcPoints(r=10,d=undef,start=0,end=180,z=undef) =
            let(r=d==undef?r:d/2,
                n=getPointsAround(abs(end-start)))
                    r*[for(i=[0:n])
                        let(angle=start+i*(end-start)/n) [cos(angle),sin(angle)]];

function ngonPoints(n=4,r=10,d=undef,rotate=0,z=undef) =
            let(r=d==undef?r:d/2)
            z==undef ?
            r*[for(i=[0:n-1]) let(angle=i*360/n+rotate) [cos(angle),sin(angle)]] :
            [for(i=[0:n-1]) let(angle=i*360/n+rotate) [r*cos(angle),r*sin(angle),z]];

function starPoints(n=10,r1=5,r2=10,rotate=0,z=undef) =
          z==undef ?
            [for(i=[0:2*n-1]) let(angle=i*180/n+rotate) (i%2?r1:r2) * [cos(angle),sin(angle)]] :
            [for(i=[0:2*n-1]) let(angle=i*180/n+rotate, r=i%2?r1:r2) [r*cos(angle),r*sin(angle),z]];

function roundedSquarePoints(size=[10,10],radius=2,z=undef) =
    let(n=$fn?$fn:32,
        x=len(size)>=2 ? size[0] : size,
        y=len(size)>=2 ? size[1] : size,
        centers=[[x-radius,y-radius],[radius,y-radius],[radius,radius],[x-radius,radius]],
        section=[for(i=[0:n-1])
            let(center=centers[floor(i*4/n)],
                angle=360*i/n)
            center+radius*[cos(angle),sin(angle)]])
        z==undef ? section : sectionZ(section,z);

function getPointsAround(radius, angle=360) =
    max(3, $fn ? ceil($fn*angle/360) :
        max(floor(0.5+angle/$fa), floor(0.5+2*radius*PI*angle/360/$fs)));

// warning: no guarantee of perfect convexity
module mySphere(r=10,d=undef) {
    GA = 2.39996322972865332 * 180 / PI;
    radius = d==undef ? r : d/2;
    pointsAround = getPointsAround(radius);
    numSlices0 = (pointsAround + pointsAround % 2)/2;
    numSlices = numSlices0 + (numSlices0%2);
    sections = radius*[for(i=[0:numSlices])
                    i == 0 ? [[0,0,-1]] :
                    i == numSlices ? [[0,0,1]] :
                    let(
                        lat = (i-numSlices/2)/(numSlices/2)*90,
                        z1 = sin(lat),
                        r1 = cos(lat),
                        count = max(3,floor(0.5 + pointsAround * abs(r1))))
                        ngonPoints(count,r=r1,z=z1)];
    data = pointsAndFaces(sections,optimize=-1);
    polyhedron(points=data[0], faces=data[1]);
}

function twistSectionXY(section,theta,autoShift=false) =
    let(
    n = len(section),
    shift=autoShift ? floor(n*_mod(theta,360)/360) : 0)
    [for (a=[0:len(section)-1])
        let(p=section[_mod(a-shift,n)])
        [for(i=[0:len(p)-1])
        i == 0 ? p[0]*cos(theta)-p[1]*sin(theta) :
        i == 1 ? p[0]*sin(theta)+p[1]*cos(theta) :
        p[i]]];

module morphExtrude(section1,section2=undef,height=undef,twist=0,numSlices=10,curve="t",curveParams=[[]],startCap=true,endCap=true,optimize=1) {

    section2 = section2==undef ? section1 : section2;

    fc = compileFunction(curve);
    function getCurve(t) = (curve=="t" ? t : eval(fc,concat([["t",t]],curveParams)));

    n = max(len(section1),len(section2));

    section1interp = _interpolateSection(section1,n);
    section2interp = _interpolateSection(section2,n);
    sections = height == undef ?
                      [for(i=[0:numSlices])
                        let(t=i/numSlices)
                        (1-t)*section1interp+t*section2interp] :
                      [for(i=[0:numSlices])
                        let(t=i/numSlices,
                            t1=getCurve(t),
                            theta = -t*twist,
                            section=(1-t1)*section1interp+t1*section2interp)
                        twistSectionXY(sectionZ(section,height*t),theta)];

    tubeMesh(sections,startCap=startCap,endCap=endCap,optimize=optimize);
}

module cone(r=10,d=undef,height=10) {
    radius = d==undef ? r : d/2;

    pointsAround = getPointsAround(radius);

    morphExtrude(ngonPoints(n=pointsAround,r=radius), [[0,0]], height=height,optimize=0);
}

module prism(base=[[0,0,0],[1,0,0],[0,1,0]], vertical=[0,0,1]) {
    morphExtrude(base,[for(v=base) v+vertical],numSlices=1);
}


//END DEPENDENCY: use <tubemesh.scad>;


// sideTol = 0.5 ok, but loose
// snapBump = 0.35

buttonDiameter = 11.7;
bottomBevel = 0.5;
buttonDepth = 5.45;
buttonWallThickness = 1;
buttonBottomThickness = 1.75;
attachmentSide1 = 3.81;
attachmentSide2 = 3.76;
attachmentHeight = 2.75;
attachmentSideTolerance = 0.35;
attachmentTopTolerance = 0.2;
snapWallThickness = 1.1;
snapSpacing = 0.25;
snapBump = 0.42;
snapBumpHeight = 0.4;
snapJoinedHeight = 0.1;

nudge = 0.01;

module snap1(length0) {
    z1 = attachmentHeight+attachmentTopTolerance;
    length = length0 - 2*snapSpacing;

    function section(length,bump,z) = sectionZ([[-bump,-length/2],[snapWallThickness,-length/2],[snapWallThickness,length/2],[-bump,length/2]],z);

    tubeMesh([section(length0+2*snapWallThickness,0,0),
        section(length0+2*snapWallThickness,0,snapJoinedHeight),
        section(length,0,z1),
        section(length,snapBump,z1+snapBump),
        section(length,0,z1+snapBump*2)]);
}

module snaps() {
    for (a=[0,180])
        rotate([0,0,a]) translate([attachmentSide2/2+attachmentSideTolerance,0,0]) snap1(attachmentSide1);
    for (a=[90,270])
        rotate([0,0,a]) translate([attachmentSide1/2+attachmentSideTolerance,0,0]) snap1(attachmentSide2);
}

$fn = 36;

module beveledCylinder(h=10,d=10,bevel=1) {
    cylinder(h=bevel,d1=d-2*bevel,d2=d);
    translate([0,0,bevel-nudge]) cylinder(h=h-bevel+nudge,d=d);
}

module button() {
    difference() {
        beveledCylinder(h=buttonDepth,d=buttonDiameter,bevel=bottomBevel);
        translate([0,0,buttonBottomThickness]) cylinder(h=buttonDepth,d=buttonDiameter-2*buttonWallThickness);
    }
}

button();
translate([0,0,buttonBottomThickness-nudge]) snaps();
